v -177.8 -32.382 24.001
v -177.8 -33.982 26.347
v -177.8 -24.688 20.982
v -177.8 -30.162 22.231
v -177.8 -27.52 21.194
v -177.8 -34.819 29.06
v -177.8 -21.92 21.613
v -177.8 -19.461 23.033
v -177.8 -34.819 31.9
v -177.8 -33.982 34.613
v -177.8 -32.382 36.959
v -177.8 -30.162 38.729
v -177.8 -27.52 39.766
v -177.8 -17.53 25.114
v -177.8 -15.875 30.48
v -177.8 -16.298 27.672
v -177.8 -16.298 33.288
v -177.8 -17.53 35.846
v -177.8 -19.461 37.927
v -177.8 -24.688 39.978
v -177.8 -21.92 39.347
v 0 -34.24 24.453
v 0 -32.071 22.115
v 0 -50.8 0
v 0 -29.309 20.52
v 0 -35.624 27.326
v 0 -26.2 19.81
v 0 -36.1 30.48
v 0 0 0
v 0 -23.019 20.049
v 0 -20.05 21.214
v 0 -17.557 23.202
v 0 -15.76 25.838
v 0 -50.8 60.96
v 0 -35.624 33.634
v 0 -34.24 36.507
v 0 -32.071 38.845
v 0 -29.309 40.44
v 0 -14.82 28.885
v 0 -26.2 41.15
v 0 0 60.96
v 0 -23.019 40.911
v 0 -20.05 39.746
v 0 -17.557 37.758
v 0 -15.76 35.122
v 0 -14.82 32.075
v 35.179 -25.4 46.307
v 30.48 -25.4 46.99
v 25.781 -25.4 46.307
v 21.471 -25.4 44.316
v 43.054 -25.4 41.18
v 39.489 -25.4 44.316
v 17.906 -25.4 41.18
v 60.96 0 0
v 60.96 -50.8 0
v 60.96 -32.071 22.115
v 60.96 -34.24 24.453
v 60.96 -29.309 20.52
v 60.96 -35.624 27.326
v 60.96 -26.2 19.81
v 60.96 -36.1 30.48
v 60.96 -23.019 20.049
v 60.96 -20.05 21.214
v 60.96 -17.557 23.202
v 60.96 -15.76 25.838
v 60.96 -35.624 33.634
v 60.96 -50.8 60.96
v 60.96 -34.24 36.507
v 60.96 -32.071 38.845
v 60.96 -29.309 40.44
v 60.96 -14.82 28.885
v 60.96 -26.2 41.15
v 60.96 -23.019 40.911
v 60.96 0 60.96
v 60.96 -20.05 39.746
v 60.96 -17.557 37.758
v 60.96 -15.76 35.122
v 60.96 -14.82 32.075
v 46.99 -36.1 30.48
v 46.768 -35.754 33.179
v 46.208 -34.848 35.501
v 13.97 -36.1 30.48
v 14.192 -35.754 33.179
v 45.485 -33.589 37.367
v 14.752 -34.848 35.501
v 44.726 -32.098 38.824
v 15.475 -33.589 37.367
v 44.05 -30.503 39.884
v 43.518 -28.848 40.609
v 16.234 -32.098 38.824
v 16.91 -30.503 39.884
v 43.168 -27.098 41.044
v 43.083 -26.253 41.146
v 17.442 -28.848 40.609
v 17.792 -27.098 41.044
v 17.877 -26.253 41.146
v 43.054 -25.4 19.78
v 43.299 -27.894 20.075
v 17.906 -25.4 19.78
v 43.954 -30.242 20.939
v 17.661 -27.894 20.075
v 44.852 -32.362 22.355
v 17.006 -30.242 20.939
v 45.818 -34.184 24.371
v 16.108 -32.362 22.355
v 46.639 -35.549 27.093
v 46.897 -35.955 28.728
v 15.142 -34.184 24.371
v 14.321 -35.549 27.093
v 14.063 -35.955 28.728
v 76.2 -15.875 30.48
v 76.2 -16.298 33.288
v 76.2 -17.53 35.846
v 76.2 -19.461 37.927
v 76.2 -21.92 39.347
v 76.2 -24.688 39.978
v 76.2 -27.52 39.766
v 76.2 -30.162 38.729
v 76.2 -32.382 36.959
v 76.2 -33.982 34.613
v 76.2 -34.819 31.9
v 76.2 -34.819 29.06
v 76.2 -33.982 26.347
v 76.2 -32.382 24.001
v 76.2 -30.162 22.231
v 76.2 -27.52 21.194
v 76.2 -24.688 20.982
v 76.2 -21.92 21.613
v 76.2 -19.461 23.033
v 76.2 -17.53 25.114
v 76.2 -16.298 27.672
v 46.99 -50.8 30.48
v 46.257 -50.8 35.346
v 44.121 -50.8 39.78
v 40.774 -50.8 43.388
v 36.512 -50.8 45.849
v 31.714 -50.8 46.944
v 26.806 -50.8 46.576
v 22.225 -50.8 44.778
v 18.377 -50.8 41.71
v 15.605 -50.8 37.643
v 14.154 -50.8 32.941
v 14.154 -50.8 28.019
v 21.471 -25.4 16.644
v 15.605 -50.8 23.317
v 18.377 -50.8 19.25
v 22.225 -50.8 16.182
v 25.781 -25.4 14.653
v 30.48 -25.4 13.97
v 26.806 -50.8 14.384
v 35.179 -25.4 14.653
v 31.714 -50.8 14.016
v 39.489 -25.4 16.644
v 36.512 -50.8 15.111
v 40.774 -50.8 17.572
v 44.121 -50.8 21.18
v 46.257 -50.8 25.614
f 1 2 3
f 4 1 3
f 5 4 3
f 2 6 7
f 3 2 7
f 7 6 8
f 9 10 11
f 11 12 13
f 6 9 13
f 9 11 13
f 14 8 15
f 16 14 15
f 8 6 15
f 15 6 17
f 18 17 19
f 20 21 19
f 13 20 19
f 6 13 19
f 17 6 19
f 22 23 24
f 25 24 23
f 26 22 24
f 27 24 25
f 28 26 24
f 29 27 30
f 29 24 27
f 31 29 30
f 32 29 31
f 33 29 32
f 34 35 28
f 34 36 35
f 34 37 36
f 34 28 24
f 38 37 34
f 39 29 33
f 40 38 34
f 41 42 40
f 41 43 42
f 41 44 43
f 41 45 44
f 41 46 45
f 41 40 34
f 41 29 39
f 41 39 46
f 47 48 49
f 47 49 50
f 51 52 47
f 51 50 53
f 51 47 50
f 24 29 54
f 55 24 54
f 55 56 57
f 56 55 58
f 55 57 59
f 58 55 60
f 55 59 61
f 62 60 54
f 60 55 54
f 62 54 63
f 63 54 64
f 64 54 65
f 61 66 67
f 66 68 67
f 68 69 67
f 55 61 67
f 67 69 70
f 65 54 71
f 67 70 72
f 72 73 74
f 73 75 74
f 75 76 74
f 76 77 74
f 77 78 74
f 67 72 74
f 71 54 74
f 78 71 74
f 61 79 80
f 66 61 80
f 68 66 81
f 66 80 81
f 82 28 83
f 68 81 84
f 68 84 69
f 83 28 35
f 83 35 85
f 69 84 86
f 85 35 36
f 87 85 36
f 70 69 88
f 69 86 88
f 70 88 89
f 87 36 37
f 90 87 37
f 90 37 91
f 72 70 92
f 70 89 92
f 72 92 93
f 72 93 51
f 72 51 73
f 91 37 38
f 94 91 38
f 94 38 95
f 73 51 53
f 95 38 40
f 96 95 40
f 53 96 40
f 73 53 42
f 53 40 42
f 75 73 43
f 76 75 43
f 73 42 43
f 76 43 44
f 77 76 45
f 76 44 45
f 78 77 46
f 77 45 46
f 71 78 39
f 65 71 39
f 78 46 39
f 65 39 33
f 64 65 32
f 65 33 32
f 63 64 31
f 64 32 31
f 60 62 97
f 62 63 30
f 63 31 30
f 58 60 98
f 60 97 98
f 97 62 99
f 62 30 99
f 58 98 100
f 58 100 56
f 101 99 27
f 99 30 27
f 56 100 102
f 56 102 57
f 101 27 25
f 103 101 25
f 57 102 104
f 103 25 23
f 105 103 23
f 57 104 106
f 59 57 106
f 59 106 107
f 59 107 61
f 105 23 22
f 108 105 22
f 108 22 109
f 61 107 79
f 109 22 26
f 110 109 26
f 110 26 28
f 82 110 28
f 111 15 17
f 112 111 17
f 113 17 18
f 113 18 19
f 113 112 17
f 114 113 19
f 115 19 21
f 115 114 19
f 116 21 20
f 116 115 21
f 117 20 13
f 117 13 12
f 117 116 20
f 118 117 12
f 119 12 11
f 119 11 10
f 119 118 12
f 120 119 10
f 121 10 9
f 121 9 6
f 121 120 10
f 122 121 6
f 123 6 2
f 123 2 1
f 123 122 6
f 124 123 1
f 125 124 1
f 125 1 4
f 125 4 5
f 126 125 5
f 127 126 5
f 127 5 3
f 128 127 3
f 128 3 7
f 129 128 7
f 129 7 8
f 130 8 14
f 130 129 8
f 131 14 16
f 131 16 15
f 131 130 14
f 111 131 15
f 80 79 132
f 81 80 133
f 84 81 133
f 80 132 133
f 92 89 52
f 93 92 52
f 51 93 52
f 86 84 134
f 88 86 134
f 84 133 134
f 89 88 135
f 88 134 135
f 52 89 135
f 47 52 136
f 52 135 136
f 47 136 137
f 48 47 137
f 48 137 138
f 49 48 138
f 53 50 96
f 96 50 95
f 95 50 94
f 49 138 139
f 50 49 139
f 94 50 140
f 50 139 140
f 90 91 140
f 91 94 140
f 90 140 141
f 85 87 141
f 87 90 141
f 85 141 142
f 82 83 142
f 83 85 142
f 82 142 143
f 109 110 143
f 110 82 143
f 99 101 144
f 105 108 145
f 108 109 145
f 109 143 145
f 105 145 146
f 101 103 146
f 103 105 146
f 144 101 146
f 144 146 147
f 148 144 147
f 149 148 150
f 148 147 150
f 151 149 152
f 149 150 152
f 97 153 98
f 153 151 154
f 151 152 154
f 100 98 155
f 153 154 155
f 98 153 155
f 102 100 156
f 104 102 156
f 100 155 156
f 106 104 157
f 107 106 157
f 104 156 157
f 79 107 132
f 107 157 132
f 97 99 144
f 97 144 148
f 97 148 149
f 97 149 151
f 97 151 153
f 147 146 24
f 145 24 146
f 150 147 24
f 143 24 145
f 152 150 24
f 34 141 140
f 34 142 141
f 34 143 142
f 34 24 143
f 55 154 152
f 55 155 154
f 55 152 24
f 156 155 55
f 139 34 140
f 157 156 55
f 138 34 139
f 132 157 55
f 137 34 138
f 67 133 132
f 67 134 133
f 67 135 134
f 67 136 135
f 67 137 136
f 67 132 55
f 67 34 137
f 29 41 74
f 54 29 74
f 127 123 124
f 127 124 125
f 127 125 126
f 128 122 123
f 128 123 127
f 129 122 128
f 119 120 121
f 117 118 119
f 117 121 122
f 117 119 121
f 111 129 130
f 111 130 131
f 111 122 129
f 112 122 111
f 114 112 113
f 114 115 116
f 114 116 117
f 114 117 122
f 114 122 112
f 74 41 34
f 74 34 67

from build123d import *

# Parameters (mm, degrees)
F0_W     = 60.96
F0_H     = 60.96
F1_DEPTH = 50.8
F2_R     = 16.51
F3_DEPTH = 25.4
F4_R     = 10.699579
F5_DEPTH = 60.96
F7_R     = 9.525
F8_DEPTH = 254


with BuildPart() as f1:
    # F0 (on Front) → F1 (new body)
    with BuildSketch(Plane.XZ):
        with Locations((30.48, 30.48)):
            Rectangle(F0_W, F0_H)
    extrude(amount=F1_DEPTH)

    # F2 (on face) → F3 (cut)
    with BuildSketch(Plane.XZ.offset(50.8)):
        with Locations((30.48, 30.48)):
            Circle(F2_R)
    extrude(amount=-F3_DEPTH, mode=Mode.SUBTRACT)

    # F4 (on face) → F5 (cut)
    with BuildSketch(Plane(origin=(0, 0, 0), x_dir=(0, -1, 0), z_dir=(-1, 0, 0))):
        with Locations((25.4, 30.48)):
            Circle(F4_R)
    extrude(amount=-F5_DEPTH, mode=Mode.SUBTRACT)


with BuildPart() as f8:
    # F7 (on offset) → F8 (new body)
    with BuildSketch(Plane.YZ.offset(76.2)):
        with Locations((-25.4, 30.48)):
            Circle(F7_R)
    extrude(amount=-F8_DEPTH)


solid = Compound([f1.part, f8.part])
